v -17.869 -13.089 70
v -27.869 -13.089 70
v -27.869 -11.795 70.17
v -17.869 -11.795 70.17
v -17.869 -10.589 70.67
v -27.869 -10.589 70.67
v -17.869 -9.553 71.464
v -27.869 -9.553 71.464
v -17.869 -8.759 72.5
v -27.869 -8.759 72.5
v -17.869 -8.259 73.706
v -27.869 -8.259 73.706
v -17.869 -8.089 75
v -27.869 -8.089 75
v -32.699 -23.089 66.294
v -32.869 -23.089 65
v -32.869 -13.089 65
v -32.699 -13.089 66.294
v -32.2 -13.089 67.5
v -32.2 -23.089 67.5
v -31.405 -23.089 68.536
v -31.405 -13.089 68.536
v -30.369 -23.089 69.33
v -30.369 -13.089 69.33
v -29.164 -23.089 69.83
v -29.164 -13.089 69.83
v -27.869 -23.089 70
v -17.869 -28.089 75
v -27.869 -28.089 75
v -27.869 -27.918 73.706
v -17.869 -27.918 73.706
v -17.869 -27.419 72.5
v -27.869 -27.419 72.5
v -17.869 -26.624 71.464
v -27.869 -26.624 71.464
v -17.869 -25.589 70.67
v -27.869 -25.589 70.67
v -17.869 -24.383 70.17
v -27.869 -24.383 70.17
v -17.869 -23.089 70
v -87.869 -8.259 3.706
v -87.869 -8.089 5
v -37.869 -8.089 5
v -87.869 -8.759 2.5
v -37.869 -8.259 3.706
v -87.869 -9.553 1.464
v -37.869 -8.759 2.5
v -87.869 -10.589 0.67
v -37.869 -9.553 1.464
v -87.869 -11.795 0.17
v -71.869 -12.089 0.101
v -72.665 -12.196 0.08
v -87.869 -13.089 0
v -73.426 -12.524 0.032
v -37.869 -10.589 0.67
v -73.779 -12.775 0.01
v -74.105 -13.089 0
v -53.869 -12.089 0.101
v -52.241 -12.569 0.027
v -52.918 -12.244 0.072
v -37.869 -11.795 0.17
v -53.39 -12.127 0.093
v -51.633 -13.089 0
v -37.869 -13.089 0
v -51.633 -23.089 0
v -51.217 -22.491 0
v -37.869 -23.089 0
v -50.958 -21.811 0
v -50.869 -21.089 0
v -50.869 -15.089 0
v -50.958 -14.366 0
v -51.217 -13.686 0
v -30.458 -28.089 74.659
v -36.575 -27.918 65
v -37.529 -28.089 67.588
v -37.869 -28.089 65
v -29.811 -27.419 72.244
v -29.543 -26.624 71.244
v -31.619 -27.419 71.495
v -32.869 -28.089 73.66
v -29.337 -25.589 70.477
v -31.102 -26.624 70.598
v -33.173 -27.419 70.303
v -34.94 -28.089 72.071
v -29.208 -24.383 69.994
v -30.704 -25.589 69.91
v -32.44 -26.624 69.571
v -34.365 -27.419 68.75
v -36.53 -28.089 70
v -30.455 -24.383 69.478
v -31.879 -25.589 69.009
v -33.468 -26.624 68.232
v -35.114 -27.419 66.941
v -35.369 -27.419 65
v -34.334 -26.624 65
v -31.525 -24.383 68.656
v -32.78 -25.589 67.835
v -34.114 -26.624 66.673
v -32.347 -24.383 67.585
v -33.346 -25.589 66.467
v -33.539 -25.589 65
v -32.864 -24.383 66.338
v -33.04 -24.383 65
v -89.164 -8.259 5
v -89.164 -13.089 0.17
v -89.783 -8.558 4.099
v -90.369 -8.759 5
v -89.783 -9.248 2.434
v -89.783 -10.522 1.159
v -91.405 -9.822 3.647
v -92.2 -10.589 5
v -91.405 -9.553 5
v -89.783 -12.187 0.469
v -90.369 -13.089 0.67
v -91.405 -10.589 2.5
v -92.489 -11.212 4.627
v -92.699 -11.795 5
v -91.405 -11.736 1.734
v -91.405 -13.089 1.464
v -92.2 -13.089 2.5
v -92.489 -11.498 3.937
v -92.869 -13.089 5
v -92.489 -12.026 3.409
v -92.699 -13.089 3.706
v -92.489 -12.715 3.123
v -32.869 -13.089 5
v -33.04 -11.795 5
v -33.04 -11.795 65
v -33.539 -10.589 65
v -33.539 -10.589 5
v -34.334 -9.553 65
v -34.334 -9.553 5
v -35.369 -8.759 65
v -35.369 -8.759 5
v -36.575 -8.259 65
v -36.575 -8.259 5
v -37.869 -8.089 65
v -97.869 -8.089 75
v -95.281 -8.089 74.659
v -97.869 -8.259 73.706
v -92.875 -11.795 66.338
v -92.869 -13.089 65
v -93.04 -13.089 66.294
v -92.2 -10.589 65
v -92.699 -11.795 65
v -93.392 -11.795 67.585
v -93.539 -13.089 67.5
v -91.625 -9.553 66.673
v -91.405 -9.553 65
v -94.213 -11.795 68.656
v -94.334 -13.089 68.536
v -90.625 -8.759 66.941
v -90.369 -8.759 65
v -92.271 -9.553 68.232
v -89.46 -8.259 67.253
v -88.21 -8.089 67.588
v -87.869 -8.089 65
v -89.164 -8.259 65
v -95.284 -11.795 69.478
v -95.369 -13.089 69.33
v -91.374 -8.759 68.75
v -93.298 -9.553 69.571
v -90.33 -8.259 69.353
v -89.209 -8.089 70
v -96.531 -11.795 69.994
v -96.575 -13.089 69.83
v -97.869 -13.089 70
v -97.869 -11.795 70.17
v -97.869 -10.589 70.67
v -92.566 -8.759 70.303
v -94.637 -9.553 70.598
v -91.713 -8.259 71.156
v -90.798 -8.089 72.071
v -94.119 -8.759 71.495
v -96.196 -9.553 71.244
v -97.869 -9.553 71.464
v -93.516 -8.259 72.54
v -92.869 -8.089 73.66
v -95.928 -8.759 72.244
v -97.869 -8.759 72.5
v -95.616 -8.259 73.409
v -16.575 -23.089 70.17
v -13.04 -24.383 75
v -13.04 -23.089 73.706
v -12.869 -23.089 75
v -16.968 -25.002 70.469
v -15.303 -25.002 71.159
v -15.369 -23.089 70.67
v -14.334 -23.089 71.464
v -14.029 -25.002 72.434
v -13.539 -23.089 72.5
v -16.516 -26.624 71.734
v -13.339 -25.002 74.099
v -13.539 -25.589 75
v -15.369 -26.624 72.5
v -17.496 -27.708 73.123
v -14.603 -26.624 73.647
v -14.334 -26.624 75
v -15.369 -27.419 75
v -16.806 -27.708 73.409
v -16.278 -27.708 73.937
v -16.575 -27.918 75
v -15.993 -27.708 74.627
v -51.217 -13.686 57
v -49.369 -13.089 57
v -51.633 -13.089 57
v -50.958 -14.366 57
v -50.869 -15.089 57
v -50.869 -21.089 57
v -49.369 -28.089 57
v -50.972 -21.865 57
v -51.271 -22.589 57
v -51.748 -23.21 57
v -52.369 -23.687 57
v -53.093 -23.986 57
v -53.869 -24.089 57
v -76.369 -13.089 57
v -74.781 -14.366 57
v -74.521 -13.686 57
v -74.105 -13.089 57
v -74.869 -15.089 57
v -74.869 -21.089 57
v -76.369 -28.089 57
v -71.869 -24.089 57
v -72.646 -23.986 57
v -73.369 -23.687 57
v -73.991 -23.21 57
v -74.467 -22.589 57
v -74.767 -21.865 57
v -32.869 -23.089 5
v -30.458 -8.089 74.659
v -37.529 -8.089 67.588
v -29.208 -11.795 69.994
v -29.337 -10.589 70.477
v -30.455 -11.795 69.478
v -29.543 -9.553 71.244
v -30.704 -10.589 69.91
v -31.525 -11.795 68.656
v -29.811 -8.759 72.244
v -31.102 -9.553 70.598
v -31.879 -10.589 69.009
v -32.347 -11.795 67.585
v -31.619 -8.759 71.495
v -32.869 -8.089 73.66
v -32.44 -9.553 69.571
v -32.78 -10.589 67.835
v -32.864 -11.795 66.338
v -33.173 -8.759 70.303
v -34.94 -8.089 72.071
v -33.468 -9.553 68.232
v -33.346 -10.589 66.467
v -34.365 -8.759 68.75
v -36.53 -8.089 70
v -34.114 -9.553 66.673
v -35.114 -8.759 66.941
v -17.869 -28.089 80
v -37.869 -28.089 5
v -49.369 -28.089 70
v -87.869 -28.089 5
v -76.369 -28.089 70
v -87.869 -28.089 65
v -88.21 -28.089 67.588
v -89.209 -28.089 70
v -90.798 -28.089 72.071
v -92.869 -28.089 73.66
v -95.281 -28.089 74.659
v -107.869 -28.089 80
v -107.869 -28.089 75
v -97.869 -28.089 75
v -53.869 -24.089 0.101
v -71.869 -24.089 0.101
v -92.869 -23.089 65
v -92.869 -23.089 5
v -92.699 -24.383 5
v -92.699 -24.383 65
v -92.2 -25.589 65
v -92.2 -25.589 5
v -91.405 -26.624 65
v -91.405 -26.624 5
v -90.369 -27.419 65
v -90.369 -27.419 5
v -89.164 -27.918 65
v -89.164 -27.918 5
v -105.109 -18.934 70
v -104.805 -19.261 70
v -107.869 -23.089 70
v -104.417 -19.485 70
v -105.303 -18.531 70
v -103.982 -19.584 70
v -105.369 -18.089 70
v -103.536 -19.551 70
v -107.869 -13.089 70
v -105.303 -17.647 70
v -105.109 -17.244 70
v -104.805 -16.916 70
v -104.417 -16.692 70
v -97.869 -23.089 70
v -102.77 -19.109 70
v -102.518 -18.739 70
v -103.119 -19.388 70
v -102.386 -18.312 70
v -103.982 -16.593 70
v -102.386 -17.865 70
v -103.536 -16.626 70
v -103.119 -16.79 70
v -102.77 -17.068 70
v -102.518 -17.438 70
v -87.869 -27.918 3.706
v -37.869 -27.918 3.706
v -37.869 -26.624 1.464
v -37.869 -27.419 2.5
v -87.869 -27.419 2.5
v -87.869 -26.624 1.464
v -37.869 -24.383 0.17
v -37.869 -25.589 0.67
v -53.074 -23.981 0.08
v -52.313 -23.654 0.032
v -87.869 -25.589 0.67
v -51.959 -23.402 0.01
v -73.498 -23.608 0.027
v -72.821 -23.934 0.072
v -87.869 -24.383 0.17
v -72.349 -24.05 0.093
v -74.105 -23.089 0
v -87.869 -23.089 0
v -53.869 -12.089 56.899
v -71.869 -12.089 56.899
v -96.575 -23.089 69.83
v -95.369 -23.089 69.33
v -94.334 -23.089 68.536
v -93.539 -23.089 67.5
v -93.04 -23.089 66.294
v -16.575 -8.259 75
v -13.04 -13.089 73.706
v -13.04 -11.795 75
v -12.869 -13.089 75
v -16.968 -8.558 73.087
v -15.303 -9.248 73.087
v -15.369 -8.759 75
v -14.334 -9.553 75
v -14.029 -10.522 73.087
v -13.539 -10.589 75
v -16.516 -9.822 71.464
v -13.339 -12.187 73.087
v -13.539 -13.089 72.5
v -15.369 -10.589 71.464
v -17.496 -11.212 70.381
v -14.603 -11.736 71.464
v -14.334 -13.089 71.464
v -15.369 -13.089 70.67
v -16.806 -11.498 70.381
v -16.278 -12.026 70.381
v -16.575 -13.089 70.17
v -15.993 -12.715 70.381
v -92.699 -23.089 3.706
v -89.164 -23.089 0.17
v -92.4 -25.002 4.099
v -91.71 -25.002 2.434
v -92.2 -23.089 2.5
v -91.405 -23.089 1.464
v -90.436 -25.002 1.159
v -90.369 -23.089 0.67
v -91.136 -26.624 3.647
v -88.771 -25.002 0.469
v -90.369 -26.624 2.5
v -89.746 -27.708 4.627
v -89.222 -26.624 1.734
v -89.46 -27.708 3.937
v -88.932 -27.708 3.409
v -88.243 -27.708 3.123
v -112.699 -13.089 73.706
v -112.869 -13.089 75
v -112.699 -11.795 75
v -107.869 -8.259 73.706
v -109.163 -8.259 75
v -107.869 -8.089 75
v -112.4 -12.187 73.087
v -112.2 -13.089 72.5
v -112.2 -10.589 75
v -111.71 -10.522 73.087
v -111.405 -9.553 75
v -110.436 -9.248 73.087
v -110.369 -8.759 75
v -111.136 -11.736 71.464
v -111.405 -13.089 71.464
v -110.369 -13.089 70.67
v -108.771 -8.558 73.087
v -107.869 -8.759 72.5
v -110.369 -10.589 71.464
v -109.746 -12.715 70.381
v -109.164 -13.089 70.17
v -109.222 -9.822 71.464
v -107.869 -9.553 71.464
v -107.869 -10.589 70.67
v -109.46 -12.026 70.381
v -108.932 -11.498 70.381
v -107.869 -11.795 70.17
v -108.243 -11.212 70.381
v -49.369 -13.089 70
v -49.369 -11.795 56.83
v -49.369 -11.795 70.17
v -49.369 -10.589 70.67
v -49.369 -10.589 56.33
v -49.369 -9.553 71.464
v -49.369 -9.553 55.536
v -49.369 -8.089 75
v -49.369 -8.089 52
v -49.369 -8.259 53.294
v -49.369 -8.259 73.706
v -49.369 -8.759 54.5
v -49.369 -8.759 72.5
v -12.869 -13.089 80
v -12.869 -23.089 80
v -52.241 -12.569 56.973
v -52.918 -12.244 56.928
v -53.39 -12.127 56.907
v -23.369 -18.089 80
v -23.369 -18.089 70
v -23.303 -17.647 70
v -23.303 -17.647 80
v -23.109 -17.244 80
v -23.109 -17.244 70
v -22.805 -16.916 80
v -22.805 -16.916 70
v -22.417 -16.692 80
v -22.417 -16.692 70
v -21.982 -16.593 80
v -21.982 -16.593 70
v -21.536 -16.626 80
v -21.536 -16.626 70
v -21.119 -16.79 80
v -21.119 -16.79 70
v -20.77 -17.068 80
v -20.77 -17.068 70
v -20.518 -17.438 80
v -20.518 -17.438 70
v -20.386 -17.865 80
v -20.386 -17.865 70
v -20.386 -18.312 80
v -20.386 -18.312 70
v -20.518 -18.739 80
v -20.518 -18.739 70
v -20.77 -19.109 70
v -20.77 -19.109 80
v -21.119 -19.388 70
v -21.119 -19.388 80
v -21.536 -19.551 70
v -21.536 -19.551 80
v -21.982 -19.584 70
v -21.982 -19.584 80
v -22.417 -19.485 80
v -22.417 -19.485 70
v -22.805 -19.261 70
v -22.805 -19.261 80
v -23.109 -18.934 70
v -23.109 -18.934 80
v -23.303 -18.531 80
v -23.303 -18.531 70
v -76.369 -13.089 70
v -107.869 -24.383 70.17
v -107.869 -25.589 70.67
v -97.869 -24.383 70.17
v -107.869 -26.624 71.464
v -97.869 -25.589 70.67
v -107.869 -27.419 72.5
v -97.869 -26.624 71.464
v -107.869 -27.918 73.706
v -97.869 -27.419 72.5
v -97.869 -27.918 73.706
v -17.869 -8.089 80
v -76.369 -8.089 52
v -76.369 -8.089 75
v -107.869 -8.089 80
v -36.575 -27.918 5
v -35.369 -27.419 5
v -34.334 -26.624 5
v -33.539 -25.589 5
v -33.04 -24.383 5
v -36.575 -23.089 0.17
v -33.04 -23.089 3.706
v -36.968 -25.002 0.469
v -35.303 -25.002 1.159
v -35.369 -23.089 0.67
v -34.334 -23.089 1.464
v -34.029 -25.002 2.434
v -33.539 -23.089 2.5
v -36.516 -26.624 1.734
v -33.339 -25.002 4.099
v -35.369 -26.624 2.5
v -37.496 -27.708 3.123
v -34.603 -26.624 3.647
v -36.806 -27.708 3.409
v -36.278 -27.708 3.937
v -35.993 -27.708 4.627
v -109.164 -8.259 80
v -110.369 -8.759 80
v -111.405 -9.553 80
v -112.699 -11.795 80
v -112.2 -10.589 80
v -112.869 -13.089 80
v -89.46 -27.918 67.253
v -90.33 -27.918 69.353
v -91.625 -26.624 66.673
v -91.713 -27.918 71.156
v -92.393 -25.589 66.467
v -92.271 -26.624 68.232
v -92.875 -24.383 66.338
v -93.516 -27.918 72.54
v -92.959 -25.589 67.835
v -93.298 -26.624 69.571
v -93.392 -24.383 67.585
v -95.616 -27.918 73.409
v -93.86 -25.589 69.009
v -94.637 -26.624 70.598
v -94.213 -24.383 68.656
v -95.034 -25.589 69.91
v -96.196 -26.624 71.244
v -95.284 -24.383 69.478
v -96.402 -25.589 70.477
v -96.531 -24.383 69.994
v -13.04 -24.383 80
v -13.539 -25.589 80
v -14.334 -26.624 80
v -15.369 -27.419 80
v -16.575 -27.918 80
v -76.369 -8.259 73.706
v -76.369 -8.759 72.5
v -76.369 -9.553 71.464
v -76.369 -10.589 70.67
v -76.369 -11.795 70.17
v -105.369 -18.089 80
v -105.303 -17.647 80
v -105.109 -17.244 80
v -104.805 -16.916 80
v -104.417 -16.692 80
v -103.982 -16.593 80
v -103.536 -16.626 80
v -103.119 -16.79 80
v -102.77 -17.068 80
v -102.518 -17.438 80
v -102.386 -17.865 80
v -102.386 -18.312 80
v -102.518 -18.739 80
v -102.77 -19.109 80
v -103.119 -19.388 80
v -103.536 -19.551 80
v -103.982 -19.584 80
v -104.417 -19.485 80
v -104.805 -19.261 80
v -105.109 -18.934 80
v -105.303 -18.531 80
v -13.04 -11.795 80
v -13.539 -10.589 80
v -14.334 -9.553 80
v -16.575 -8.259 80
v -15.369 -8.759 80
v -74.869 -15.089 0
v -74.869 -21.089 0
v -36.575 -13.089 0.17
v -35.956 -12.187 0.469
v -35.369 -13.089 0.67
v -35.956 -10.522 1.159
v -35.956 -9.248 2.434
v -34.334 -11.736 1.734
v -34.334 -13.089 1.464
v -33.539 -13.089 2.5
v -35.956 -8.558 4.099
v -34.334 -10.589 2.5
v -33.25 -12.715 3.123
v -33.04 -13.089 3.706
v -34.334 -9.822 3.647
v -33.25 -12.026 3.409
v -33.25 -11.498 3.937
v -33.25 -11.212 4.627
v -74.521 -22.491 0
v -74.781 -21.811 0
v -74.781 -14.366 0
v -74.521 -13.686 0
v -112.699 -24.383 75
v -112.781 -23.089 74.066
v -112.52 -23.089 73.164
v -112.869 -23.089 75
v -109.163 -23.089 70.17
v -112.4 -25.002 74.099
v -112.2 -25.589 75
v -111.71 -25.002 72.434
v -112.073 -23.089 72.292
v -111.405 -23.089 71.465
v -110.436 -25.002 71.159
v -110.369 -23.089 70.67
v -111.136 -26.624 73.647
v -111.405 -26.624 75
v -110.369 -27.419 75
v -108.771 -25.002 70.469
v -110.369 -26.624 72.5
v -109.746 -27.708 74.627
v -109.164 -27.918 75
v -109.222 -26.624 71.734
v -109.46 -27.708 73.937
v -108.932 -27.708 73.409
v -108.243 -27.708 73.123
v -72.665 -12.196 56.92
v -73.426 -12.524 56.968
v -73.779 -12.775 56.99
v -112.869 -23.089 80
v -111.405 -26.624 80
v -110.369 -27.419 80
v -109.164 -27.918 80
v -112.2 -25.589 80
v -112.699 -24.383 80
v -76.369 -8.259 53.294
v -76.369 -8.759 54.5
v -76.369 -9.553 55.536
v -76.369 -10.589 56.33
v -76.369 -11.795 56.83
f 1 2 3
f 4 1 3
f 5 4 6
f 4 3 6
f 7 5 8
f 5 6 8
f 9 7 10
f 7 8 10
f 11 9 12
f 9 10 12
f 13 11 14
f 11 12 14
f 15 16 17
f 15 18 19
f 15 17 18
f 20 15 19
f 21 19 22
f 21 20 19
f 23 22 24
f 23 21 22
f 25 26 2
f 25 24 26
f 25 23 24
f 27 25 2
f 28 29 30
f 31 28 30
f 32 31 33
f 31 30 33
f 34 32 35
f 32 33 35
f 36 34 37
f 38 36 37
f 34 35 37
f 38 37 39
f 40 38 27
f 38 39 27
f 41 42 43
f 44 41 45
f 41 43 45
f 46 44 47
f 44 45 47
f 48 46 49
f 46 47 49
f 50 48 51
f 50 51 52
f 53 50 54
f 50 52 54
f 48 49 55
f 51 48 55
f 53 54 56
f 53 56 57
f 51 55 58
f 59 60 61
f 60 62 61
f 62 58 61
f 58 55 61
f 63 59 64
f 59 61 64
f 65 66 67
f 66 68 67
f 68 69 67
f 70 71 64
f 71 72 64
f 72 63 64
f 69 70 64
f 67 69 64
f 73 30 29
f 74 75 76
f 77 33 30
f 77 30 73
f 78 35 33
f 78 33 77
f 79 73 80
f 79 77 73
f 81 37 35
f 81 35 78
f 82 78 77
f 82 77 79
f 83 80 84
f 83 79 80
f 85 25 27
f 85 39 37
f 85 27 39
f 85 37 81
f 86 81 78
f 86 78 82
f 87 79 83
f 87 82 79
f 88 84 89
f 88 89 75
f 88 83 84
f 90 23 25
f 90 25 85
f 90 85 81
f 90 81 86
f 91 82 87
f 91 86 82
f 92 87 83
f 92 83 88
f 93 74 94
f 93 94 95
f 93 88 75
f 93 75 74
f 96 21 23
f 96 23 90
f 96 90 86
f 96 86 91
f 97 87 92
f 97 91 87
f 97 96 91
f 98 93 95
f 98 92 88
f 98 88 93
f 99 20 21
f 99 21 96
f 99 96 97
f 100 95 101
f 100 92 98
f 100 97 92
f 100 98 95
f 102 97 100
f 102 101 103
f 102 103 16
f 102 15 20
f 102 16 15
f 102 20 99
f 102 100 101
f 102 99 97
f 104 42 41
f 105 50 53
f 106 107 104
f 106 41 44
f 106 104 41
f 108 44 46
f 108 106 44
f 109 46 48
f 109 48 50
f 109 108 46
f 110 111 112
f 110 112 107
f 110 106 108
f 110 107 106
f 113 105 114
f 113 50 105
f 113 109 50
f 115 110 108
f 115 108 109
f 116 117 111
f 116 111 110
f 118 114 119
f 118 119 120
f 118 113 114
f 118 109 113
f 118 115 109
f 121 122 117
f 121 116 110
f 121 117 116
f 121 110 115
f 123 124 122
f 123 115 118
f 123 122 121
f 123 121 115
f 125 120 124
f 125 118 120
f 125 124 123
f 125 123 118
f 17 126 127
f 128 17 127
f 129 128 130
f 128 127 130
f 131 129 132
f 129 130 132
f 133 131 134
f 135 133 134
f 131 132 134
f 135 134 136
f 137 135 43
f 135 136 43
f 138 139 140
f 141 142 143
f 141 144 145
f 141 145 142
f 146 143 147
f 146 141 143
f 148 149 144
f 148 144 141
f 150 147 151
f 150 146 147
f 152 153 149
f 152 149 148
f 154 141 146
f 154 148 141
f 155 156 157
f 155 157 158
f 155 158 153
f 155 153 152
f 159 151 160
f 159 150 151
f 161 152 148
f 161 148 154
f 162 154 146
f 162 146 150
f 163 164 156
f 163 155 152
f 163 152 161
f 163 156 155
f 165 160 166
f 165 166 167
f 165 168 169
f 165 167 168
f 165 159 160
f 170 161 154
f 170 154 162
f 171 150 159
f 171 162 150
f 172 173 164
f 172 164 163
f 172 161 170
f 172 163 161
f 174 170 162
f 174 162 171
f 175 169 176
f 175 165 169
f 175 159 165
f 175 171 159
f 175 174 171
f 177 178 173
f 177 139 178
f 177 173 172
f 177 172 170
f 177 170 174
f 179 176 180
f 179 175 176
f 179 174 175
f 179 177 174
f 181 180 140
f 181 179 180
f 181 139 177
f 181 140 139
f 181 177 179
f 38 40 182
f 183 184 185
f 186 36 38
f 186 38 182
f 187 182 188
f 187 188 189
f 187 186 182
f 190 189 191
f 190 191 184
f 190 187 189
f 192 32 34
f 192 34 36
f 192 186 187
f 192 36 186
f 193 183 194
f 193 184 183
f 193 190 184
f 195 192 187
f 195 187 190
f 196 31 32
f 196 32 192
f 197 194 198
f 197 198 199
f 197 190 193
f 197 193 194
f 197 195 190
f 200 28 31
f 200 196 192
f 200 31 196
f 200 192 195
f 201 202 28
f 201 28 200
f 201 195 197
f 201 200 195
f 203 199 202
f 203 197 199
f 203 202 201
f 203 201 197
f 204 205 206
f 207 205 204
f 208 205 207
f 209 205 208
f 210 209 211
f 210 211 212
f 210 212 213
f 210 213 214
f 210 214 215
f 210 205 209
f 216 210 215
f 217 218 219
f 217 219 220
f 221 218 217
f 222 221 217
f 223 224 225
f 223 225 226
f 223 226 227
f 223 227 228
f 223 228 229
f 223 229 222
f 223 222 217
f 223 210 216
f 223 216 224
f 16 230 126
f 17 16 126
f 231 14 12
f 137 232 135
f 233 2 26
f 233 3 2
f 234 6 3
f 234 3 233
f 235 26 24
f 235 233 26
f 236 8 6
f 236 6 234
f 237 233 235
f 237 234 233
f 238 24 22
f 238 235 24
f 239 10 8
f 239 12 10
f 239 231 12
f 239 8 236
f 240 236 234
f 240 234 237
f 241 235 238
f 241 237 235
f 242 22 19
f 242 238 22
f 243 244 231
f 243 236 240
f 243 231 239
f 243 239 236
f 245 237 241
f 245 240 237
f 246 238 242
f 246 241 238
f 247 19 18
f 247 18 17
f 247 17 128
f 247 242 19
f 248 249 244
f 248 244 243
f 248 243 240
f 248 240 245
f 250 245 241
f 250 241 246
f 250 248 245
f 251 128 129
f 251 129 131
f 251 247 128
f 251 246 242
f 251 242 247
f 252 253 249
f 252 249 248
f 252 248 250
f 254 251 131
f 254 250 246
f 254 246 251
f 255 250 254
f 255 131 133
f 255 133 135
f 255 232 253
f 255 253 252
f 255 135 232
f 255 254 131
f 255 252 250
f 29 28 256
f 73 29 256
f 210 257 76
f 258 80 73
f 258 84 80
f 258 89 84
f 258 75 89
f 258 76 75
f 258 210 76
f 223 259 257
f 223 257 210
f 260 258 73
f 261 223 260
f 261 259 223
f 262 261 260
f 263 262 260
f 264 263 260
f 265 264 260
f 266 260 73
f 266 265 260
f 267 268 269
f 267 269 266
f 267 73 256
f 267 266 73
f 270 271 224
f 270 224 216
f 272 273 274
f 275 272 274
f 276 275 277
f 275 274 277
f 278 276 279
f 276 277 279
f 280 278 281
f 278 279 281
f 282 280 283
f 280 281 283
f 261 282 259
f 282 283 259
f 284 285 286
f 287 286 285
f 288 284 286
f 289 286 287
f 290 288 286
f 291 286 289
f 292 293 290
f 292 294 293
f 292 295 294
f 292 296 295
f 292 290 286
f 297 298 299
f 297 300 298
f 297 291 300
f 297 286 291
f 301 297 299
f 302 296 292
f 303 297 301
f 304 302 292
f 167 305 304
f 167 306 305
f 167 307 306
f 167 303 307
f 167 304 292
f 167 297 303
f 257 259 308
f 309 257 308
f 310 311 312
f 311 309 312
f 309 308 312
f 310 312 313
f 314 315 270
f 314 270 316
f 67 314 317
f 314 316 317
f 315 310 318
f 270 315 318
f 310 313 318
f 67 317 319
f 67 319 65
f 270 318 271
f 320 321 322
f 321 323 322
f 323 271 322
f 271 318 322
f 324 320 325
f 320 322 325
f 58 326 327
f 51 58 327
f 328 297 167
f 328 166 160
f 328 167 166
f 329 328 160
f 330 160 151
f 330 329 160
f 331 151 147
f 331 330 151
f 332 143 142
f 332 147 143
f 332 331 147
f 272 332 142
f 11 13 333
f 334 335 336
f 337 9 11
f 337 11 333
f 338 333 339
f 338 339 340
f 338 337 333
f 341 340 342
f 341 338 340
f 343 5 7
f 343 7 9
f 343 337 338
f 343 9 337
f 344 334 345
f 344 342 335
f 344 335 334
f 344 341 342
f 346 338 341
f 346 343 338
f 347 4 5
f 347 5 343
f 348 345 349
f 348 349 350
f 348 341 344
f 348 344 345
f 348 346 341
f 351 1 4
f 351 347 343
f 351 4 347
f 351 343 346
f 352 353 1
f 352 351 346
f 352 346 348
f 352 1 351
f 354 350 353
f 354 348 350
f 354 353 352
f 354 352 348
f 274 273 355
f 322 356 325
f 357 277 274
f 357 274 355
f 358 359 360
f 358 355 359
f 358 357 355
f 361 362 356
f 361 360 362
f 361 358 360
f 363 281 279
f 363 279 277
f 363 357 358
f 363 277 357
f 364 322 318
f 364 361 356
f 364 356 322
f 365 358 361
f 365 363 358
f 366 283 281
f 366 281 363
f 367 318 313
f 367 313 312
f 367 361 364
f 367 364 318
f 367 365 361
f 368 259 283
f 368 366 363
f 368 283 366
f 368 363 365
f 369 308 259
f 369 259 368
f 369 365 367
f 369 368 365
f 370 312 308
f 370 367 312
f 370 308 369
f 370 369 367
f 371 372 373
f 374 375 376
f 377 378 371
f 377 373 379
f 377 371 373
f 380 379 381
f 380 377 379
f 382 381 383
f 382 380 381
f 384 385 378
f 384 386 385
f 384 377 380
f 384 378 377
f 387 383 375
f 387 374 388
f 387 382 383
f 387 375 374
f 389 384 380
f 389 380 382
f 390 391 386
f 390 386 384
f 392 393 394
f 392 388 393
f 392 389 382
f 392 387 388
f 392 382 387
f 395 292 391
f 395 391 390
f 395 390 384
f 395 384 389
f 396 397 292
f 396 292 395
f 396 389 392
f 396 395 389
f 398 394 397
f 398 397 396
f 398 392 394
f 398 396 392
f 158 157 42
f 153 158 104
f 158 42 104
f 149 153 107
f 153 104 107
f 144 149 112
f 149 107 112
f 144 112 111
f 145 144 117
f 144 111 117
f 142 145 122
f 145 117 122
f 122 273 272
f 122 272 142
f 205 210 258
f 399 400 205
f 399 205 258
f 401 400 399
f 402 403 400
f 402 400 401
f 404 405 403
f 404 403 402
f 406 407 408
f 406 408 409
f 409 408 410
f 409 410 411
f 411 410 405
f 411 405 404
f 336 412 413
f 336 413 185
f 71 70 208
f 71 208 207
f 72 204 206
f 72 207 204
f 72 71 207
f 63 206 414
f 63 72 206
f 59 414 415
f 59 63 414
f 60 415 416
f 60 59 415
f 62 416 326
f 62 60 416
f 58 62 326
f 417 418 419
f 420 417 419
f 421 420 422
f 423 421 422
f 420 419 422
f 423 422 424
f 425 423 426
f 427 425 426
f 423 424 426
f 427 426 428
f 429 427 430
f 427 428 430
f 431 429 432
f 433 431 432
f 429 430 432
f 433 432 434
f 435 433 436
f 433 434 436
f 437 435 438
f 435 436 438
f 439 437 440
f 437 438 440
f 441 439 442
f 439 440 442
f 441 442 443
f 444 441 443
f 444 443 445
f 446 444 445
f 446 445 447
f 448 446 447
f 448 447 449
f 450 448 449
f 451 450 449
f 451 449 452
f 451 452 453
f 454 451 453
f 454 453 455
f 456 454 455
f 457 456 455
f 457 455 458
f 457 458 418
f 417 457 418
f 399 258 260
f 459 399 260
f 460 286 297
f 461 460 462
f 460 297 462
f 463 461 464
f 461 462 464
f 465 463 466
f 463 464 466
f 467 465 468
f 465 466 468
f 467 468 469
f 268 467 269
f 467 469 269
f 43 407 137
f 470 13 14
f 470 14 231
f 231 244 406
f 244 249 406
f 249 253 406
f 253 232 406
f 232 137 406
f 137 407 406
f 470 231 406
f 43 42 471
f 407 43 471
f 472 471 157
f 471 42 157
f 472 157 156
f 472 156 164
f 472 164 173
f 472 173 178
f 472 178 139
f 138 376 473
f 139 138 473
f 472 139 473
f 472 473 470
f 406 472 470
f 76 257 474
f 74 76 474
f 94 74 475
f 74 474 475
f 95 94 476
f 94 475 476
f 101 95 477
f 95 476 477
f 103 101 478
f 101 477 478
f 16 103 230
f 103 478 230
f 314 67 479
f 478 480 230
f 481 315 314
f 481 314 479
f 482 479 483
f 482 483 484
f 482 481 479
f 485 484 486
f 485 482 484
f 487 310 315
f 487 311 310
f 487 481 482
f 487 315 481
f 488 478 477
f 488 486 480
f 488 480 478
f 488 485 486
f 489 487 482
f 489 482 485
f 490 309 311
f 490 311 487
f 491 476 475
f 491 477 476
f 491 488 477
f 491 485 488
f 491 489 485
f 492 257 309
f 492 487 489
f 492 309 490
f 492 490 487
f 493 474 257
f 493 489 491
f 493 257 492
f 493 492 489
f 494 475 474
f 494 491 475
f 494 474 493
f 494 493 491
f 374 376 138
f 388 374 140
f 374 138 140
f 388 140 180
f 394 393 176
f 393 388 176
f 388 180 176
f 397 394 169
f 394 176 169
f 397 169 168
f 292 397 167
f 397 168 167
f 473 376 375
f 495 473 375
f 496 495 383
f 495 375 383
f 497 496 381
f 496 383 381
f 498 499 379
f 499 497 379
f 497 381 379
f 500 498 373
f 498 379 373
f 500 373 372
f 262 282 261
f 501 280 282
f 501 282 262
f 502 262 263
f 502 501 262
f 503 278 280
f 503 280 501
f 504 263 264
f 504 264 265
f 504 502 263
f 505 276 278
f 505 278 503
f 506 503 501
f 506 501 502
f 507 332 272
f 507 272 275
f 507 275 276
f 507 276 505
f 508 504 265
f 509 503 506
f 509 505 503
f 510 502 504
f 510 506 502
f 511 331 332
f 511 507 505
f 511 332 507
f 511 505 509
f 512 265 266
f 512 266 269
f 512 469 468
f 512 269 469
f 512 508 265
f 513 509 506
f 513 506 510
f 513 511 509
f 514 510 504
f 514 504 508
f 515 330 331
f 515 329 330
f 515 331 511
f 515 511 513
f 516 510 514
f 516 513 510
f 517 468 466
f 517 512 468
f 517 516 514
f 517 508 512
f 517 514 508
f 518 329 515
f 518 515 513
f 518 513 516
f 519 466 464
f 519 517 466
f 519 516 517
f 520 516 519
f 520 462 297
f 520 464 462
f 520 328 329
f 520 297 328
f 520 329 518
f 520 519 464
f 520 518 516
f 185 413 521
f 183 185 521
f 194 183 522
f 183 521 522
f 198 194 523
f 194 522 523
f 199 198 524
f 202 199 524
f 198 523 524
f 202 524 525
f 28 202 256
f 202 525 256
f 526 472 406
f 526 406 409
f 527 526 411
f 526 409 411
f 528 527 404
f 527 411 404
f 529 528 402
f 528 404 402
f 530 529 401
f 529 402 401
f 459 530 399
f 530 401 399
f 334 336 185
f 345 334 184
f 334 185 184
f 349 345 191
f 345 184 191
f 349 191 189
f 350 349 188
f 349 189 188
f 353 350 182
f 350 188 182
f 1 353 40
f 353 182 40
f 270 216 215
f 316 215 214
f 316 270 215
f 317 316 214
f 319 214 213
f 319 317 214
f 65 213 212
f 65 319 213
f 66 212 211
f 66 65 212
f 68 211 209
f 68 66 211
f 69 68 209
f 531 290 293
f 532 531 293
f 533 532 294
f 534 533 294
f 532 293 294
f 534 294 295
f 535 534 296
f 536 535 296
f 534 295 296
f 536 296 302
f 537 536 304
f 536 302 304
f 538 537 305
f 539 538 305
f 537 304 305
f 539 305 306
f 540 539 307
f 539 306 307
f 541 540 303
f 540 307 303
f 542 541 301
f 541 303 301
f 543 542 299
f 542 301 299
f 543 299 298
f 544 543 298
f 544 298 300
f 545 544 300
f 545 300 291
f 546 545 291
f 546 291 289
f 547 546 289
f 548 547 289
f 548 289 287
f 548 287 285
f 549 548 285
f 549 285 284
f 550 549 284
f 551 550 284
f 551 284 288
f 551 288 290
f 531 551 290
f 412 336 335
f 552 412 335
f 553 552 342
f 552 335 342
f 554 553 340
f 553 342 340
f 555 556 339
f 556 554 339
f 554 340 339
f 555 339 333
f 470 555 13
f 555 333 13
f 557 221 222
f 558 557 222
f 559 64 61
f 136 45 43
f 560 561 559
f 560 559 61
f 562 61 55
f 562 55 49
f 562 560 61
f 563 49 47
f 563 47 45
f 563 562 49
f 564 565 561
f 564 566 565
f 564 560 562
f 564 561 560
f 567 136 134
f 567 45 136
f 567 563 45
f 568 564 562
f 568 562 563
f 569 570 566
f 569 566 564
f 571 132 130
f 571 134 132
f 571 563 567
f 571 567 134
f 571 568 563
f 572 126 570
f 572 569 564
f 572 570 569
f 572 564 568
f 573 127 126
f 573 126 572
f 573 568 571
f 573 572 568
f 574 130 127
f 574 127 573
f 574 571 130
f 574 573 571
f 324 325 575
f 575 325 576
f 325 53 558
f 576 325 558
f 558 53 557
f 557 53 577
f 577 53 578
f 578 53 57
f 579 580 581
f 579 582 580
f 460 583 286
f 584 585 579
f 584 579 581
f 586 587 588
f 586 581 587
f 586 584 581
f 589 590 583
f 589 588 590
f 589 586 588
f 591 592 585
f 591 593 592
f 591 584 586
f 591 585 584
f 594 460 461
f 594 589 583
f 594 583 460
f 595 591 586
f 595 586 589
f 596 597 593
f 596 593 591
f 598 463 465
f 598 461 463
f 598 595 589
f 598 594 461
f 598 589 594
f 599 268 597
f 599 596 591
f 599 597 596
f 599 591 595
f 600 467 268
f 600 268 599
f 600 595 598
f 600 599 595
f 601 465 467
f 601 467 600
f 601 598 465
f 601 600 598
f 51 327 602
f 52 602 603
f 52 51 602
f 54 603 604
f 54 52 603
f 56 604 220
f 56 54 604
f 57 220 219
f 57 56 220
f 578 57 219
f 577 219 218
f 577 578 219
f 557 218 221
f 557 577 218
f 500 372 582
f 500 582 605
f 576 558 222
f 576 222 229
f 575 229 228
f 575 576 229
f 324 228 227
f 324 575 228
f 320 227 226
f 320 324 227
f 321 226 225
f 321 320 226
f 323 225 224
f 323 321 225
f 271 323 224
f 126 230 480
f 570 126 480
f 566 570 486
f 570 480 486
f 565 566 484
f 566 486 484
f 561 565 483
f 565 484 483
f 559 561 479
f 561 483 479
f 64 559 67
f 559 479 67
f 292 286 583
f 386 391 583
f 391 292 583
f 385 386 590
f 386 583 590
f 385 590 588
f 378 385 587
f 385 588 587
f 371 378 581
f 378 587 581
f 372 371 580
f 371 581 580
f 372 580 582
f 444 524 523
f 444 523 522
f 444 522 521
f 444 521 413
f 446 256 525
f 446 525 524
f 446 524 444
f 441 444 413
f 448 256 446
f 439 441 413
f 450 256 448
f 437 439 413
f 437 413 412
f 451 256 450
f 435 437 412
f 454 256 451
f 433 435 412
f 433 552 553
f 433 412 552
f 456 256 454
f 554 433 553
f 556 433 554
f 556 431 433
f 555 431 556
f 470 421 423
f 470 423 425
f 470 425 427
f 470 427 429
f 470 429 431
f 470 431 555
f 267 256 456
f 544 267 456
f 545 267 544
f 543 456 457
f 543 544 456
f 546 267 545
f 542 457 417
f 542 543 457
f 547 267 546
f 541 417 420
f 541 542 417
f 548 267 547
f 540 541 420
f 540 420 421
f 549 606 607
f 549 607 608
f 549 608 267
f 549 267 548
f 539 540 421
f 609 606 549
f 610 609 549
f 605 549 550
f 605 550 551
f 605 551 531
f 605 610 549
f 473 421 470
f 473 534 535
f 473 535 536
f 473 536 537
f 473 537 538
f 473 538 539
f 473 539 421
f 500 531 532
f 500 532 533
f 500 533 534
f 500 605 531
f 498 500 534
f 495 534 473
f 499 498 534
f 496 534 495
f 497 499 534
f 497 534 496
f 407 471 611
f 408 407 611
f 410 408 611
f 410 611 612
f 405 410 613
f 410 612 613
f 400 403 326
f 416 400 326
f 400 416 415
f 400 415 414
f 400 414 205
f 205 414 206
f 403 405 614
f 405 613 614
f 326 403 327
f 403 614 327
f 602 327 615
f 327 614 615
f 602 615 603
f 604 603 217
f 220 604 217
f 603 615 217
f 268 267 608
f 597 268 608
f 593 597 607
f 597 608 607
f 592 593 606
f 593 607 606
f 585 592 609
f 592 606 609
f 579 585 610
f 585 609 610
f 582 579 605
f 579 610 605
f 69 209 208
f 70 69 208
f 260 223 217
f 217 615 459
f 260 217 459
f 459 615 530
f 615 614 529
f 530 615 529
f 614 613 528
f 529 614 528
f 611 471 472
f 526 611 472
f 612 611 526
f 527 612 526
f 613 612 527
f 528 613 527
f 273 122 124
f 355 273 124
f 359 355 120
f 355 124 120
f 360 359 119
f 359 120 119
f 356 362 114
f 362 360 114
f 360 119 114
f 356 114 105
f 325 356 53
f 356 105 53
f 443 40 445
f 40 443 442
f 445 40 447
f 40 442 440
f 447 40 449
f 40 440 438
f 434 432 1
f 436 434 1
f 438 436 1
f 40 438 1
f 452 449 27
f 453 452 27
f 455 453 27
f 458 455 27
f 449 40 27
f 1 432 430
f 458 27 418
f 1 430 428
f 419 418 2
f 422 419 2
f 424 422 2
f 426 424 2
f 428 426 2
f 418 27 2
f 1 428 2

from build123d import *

# Parameters (mm, degrees)
ESBO_O1_W                = 60
ESBO_O1_H                = 20
RESSALTO_EXTRUS_O1_DEPTH = 80
ESBO_O4_W                = 27
ESBO_O4_H                = 13
CORTE_EXTRUS_O2_DEPTH    = 125.196330299
ESBO_O6_W                = 10
ESBO_O6_H                = 20
RESSALTO_EXTRUS_O2_DEPTH = 20
ESBO_O5_W                = 10
ESBO_O5_H                = 20
RESSALTO_EXTRUS_O3_DEPTH = 20
CORTE_EXTRUS_O4_REACH    = 143.168
FILETE1_R                = 5
ESBO_O8_R                = 1.5
CORTE_EXTRUS_O5_DEPTH    = 136.751531604
FILETE2_R                = 5


with BuildPart() as part:
    # Esboço1 → Ressalto-extrusão1 (new body)
    with BuildSketch(Plane.XY):
        with Locations((-62.86941617, -18.088666872)):
            Rectangle(ESBO_O1_W, ESBO_O1_H)
    extrude(amount=RESSALTO_EXTRUS_O1_DEPTH)

    # Esboço4 → Corte-extrusão2 (cut, through all)
    with BuildSketch(Plane(origin=(0, -28.088666872, 0), x_dir=(-1, 0, 0), z_dir=(0, -1, 0))):
        with Locations((62.86941617, -63.5)):
            Rectangle(ESBO_O4_W, ESBO_O4_H)
    extrude(amount=-CORTE_EXTRUS_O2_DEPTH, mode=Mode.SUBTRACT)

    # Esboço6 → Ressalto-extrusão2 (add)
    with BuildSketch(Plane.ZY.offset(92.86941617)):
        with Locations((75, -18.088666872)):
            Rectangle(ESBO_O6_W, ESBO_O6_H)
    extrude(amount=RESSALTO_EXTRUS_O2_DEPTH)

    # Esboço5 → Ressalto-extrusão3 (add)
    with BuildSketch(Plane(origin=(-32.86941617, 0, 0), x_dir=(0, 0, -1), z_dir=(1, 0, 0))):
        with Locations((-75, -18.088666872)):
            Rectangle(ESBO_O5_W, ESBO_O5_H)
    extrude(amount=RESSALTO_EXTRUS_O3_DEPTH)

    # Esboço7 → Corte-extrusão4 (cut, up to next)
    with BuildSketch(Plane(origin=(0, 0, 0), x_dir=(-1, 0, 0), z_dir=(0, 0, -1)), mode=Mode.PRIVATE) as corte_extrus_o4_sk1:
        with BuildLine():
            Line((71.86941617, -24.088666872), (53.86941617, -24.088666872))
            ThreePointArc((53.86941617, -24.088666872), (51.748095827, -23.209987216), (50.86941617, -21.088666872))
            Line((50.86941617, -21.088666872), (50.86941617, -15.088666872))
            ThreePointArc((50.86941617, -15.088666872), (51.748095827, -12.967346529), (53.86941617, -12.088666872))
            Line((53.86941617, -12.088666872), (71.86941617, -12.088666872))
            ThreePointArc((71.86941617, -12.088666872), (73.990736514, -12.967346529), (74.86941617, -15.088666872))
            Line((74.86941617, -15.088666872), (74.86941617, -21.088666872))
            ThreePointArc((74.86941617, -21.088666872), (73.990736514, -23.209987216), (71.86941617, -24.088666872))
        make_face()
    corte_extrus_o4_tool1 = extrude(corte_extrus_o4_sk1.sketch, amount=-CORTE_EXTRUS_O4_REACH, mode=Mode.PRIVATE) & part.part
    add(corte_extrus_o4_tool1.solids().sort_by_distance((-62.869416, -18.088667, 0))[0], mode=Mode.SUBTRACT)

    # Filete1
    # the kernel refuses this fillet: 5 mm, written as the material it adds along each edge
    with BuildSketch(Plane(origin=(-92.86941617, -28.088666872, 70), x_dir=(0, 0, -1), z_dir=(0, 1, 0)), Plane(origin=(-32.86941617, -28.088666872, 70), x_dir=(1, 0, 0), z_dir=(0, 1, 0))) as filete1_piece_1:
        with BuildLine():
            CenterArc((FILETE1_R, FILETE1_R), FILETE1_R, 180, 90)
            Line((0, FILETE1_R), (0, 0))
            Line((0, 0), (FILETE1_R, 0))
        make_face()
    extrude(amount=20)
    # the kernel refuses this fillet: 5 mm, written as the material it takes off along each edge
    with BuildSketch(Plane(origin=(-12.86941617, -8.088666872, 57.5), x_dir=(0, -1, 0), z_dir=(0, 0, 1)), Plane(origin=(-112.86941617, -28.088666872, 92.5), x_dir=(1, 0, 0), z_dir=(0, 0, -1))) as filete1_2_piece_1:
        with BuildLine():
            CenterArc((FILETE1_R, -FILETE1_R), FILETE1_R, 90, 90)
            Line((0, -FILETE1_R), (0, 0))
            Line((0, 0), (FILETE1_R, 0))
        make_face()
    extrude(amount=35, mode=Mode.SUBTRACT)
    with BuildSketch(Plane(origin=(-112.86941617, -8.088666872, 57.5), x_dir=(0, -1, 0), z_dir=(0, 0, 1)), Plane(origin=(-12.86941617, -28.088666872, 92.5), x_dir=(-1, 0, 0), z_dir=(0, 0, -1))) as filete1_2_piece_2:
        with BuildLine():
            CenterArc((FILETE1_R, FILETE1_R), FILETE1_R, 180, 90)
            Line((0, FILETE1_R), (0, 0))
            Line((0, 0), (FILETE1_R, 0))
        make_face()
    extrude(amount=35, mode=Mode.SUBTRACT)
    with BuildSketch(Plane(origin=(-112.86941617, -40.588666872, 70), x_dir=(1, 0, 0), z_dir=(0, 1, 0)), Plane(origin=(-12.86941617, -40.588666872, 70), x_dir=(0, 0, 1), z_dir=(0, 1, 0)), Plane(origin=(-92.86941617, 4.411333128, 0), x_dir=(0, 0, 1), z_dir=(0, -1, 0)), Plane(origin=(-32.86941617, -40.588666872, 0), x_dir=(0, 0, 1), z_dir=(0, 1, 0))) as filete1_2_piece_3:
        with BuildLine():
            CenterArc((FILETE1_R, -FILETE1_R), FILETE1_R, 90, 90)
            Line((0, -FILETE1_R), (0, 0))
            Line((0, 0), (FILETE1_R, 0))
        make_face()
    extrude(amount=45, mode=Mode.SUBTRACT)
    with BuildSketch(Plane(origin=(-105.36941617, -28.088666872, 0), x_dir=(0, 0, 1), z_dir=(1, 0, 0))) as filete1_2_piece_4:
        with BuildLine():
            CenterArc((FILETE1_R, -FILETE1_R), FILETE1_R, 90, 90)
            Line((0, -FILETE1_R), (0, 0))
            Line((0, 0), (FILETE1_R, 0))
        make_face()
    extrude(amount=85, mode=Mode.SUBTRACT)
    with BuildSketch(Plane(origin=(-20.36941617, -8.088666872, 0), x_dir=(0, -1, 0), z_dir=(-1, 0, 0))) as filete1_2_piece_5:
        with BuildLine():
            CenterArc((FILETE1_R, FILETE1_R), FILETE1_R, 180, 90)
            Line((0, FILETE1_R), (0, 0))
            Line((0, 0), (FILETE1_R, 0))
        make_face()
    extrude(amount=85, mode=Mode.SUBTRACT)
    # the kernel refuses this fillet: 5 mm, written as the material it takes off along each edge
    with BuildSketch(Plane(origin=(-87.86941617, -23.088666872, 5), x_dir=(-1, 0, 0), z_dir=(0, -1, 0))) as filete1_3_piece_1_section:
        Polygon((0, 0), (FILETE1_R, 0), (FILETE1_R, FILETE1_R), (0, FILETE1_R), align=None)
    filete1_3_piece_1 = extrude(amount=FILETE1_R, mode=Mode.PRIVATE)
    filete1_3_piece_1 = filete1_3_piece_1 - Plane(origin=(-87.86941617, -23.088666872, 5), x_dir=(0.7071067811865475, 0, 0.7071067811865475), z_dir=(0, -1, 0)) * Sphere(FILETE1_R, mode=Mode.PRIVATE)
    add(filete1_3_piece_1, mode=Mode.SUBTRACT)
    with BuildSketch(Plane(origin=(-87.86941617, -13.088666872, 5), x_dir=(0, 1, 0), z_dir=(-1, 0, 0))) as filete1_3_piece_2_section:
        Polygon((0, 0), (FILETE1_R, 0), (FILETE1_R, FILETE1_R), (0, FILETE1_R), align=None)
    filete1_3_piece_2 = extrude(amount=FILETE1_R, mode=Mode.PRIVATE)
    filete1_3_piece_2 = filete1_3_piece_2 - Plane(origin=(-87.86941617, -13.088666872, 5), x_dir=(0, -0.7071067811865475, 0.7071067811865475), z_dir=(-1, 0, 0)) * Sphere(FILETE1_R, mode=Mode.PRIVATE)
    add(filete1_3_piece_2, mode=Mode.SUBTRACT)
    with BuildSketch(Plane(origin=(-37.86941617, -13.088666872, 5), x_dir=(0, 1, 0), z_dir=(1, 0, 0))) as filete1_3_piece_3_section:
        Polygon((0, 0), (FILETE1_R, 0), (FILETE1_R, -FILETE1_R), (0, -FILETE1_R), align=None)
    filete1_3_piece_3 = extrude(amount=FILETE1_R, mode=Mode.PRIVATE)
    filete1_3_piece_3 = filete1_3_piece_3 - Plane(origin=(-37.86941617, -13.088666872, 5), x_dir=(0, -0.7071067811865475, 0.7071067811865475), z_dir=(1, 0, 0)) * Sphere(FILETE1_R, mode=Mode.PRIVATE)
    add(filete1_3_piece_3, mode=Mode.SUBTRACT)
    with BuildSketch(Plane(origin=(-37.86941617, -23.088666872, 5), x_dir=(1, 0, 0), z_dir=(0, -1, 0))) as filete1_3_piece_4_section:
        Polygon((0, 0), (FILETE1_R, 0), (FILETE1_R, -FILETE1_R), (0, -FILETE1_R), align=None)
    filete1_3_piece_4 = extrude(amount=FILETE1_R, mode=Mode.PRIVATE)
    filete1_3_piece_4 = filete1_3_piece_4 - Plane(origin=(-37.86941617, -23.088666872, 5), x_dir=(-0.7071067811865475, 0, 0.7071067811865475), z_dir=(0, -1, 0)) * Sphere(FILETE1_R, mode=Mode.PRIVATE)
    add(filete1_3_piece_4, mode=Mode.SUBTRACT)
    with BuildSketch(Plane(origin=(-107.86941617, -23.088666872, 75), x_dir=(0, 0, -1), z_dir=(0, -1, 0))) as filete1_3_piece_5_section:
        Polygon((0, 0), (FILETE1_R, 0), (FILETE1_R, -FILETE1_R), (0, -FILETE1_R), align=None)
    filete1_3_piece_5 = extrude(amount=FILETE1_R, mode=Mode.PRIVATE)
    filete1_3_piece_5 = filete1_3_piece_5 - Plane(origin=(-107.86941617, -23.088666872, 75), x_dir=(0.7071067811865475, 0, 0.7071067811865475), z_dir=(0, -1, 0)) * Sphere(FILETE1_R, mode=Mode.PRIVATE)
    add(filete1_3_piece_5, mode=Mode.SUBTRACT)
    with BuildSketch(Plane(origin=(-17.86941617, -13.088666872, 75), x_dir=(0, 1, 0), z_dir=(0, 0, -1))) as filete1_3_piece_6_section:
        Polygon((0, 0), (FILETE1_R, 0), (FILETE1_R, FILETE1_R), (0, FILETE1_R), align=None)
    filete1_3_piece_6 = extrude(amount=FILETE1_R, mode=Mode.PRIVATE)
    filete1_3_piece_6 = filete1_3_piece_6 - Plane(origin=(-17.86941617, -13.088666872, 75), x_dir=(-0.7071067811865475, -0.7071067811865475, 0), z_dir=(0, 0, -1)) * Sphere(FILETE1_R, mode=Mode.PRIVATE)
    add(filete1_3_piece_6, mode=Mode.SUBTRACT)
    with BuildSketch(Plane(origin=(-17.86941617, -23.088666872, 75), x_dir=(0, 0, -1), z_dir=(0, -1, 0))) as filete1_3_piece_7_section:
        Polygon((0, 0), (FILETE1_R, 0), (FILETE1_R, FILETE1_R), (0, FILETE1_R), align=None)
    filete1_3_piece_7 = extrude(amount=FILETE1_R, mode=Mode.PRIVATE)
    filete1_3_piece_7 = filete1_3_piece_7 - Plane(origin=(-17.86941617, -23.088666872, 75), x_dir=(-0.7071067811865475, 0, 0.7071067811865475), z_dir=(0, -1, 0)) * Sphere(FILETE1_R, mode=Mode.PRIVATE)
    add(filete1_3_piece_7, mode=Mode.SUBTRACT)
    with BuildSketch(Plane(origin=(-107.86941617, -13.088666872, 75), x_dir=(0, 1, 0), z_dir=(0, 0, -1))) as filete1_3_piece_8_section:
        Polygon((0, 0), (FILETE1_R, 0), (FILETE1_R, -FILETE1_R), (0, -FILETE1_R), align=None)
    filete1_3_piece_8 = extrude(amount=FILETE1_R, mode=Mode.PRIVATE)
    filete1_3_piece_8 = filete1_3_piece_8 - Plane(origin=(-107.86941617, -13.088666872, 75), x_dir=(0.7071067811865475, -0.7071067811865475, 0), z_dir=(0, 0, -1)) * Sphere(FILETE1_R, mode=Mode.PRIVATE)
    add(filete1_3_piece_8, mode=Mode.SUBTRACT)
    with BuildSketch(Plane(origin=(-97.86941617, -8.088666872, 70), x_dir=(0, -1, 0), z_dir=(-1, 0, 0)), Plane(origin=(-97.86941617, -28.088666872, 70), x_dir=(0, 0, 1), z_dir=(-1, 0, 0))) as filete1_3_piece_9:
        with BuildLine():
            CenterArc((FILETE1_R, FILETE1_R), FILETE1_R, 180, 90)
            Line((0, FILETE1_R), (0, 0))
            Line((0, 0), (FILETE1_R, 0))
        make_face()
    extrude(amount=10, mode=Mode.SUBTRACT)
    with BuildSketch(Plane(origin=(-27.86941617, -28.088666872, 70), x_dir=(0, 0, 1), z_dir=(1, 0, 0)), Plane(origin=(-27.86941617, -8.088666872, 70), x_dir=(0, -1, 0), z_dir=(1, 0, 0))) as filete1_3_piece_10:
        with BuildLine():
            CenterArc((FILETE1_R, -FILETE1_R), FILETE1_R, 90, 90)
            Line((0, -FILETE1_R), (0, 0))
            Line((0, 0), (FILETE1_R, 0))
        make_face()
    extrude(amount=10, mode=Mode.SUBTRACT)
    with BuildSketch(Plane(origin=(-32.86941617, -28.088666872, 5), x_dir=(-1, 0, 0), z_dir=(0, 0, 1)), Plane(origin=(-32.86941617, -8.088666872, 5), x_dir=(0, -1, 0), z_dir=(0, 0, 1))) as filete1_3_piece_11:
        with BuildLine():
            CenterArc((FILETE1_R, -FILETE1_R), FILETE1_R, 90, 90)
            Line((0, -FILETE1_R), (0, 0))
            Line((0, 0), (FILETE1_R, 0))
        make_face()
    extrude(amount=60, mode=Mode.SUBTRACT)
    with BuildSketch(Plane(origin=(-92.86941617, -8.088666872, 5), x_dir=(0, -1, 0), z_dir=(0, 0, 1)), Plane(origin=(-92.86941617, -28.088666872, 5), x_dir=(1, 0, 0), z_dir=(0, 0, 1))) as filete1_3_piece_12:
        with BuildLine():
            CenterArc((FILETE1_R, FILETE1_R), FILETE1_R, 180, 90)
            Line((0, FILETE1_R), (0, 0))
            Line((0, 0), (FILETE1_R, 0))
        make_face()
    extrude(amount=60, mode=Mode.SUBTRACT)
    with BuildSketch(Plane(origin=(-97.86941617, -28.088666872, 65), x_dir=(1, 0, 0), z_dir=(0, 0, -1))) as filete1_3_piece_13:
        with BuildLine():
            CenterArc((5 + FILETE1_R, -FILETE1_R), FILETE1_R, 90, 90)
            Line((5, -FILETE1_R), (5, 0))
            Line((5, 0), (5 + FILETE1_R, 0))
        make_face()
    revolve(axis=Axis((-97.86941617, -28.088666872, 65), (0, -1, 0)), revolution_arc=90, mode=Mode.SUBTRACT)
    with BuildSketch(Plane(origin=(-97.86941617, -8.088666872, 65), x_dir=(1, 0, 0), z_dir=(0, 0, -1))) as filete1_3_piece_14:
        with BuildLine():
            CenterArc((5 + FILETE1_R, FILETE1_R), FILETE1_R, 180, 90)
            Line((5 + FILETE1_R, 0), (5, 0))
            Line((5, 0), (5, FILETE1_R))
        make_face()
    revolve(axis=Axis((-97.86941617, -8.088666872, 65), (0, -1, 0)), revolution_arc=90, mode=Mode.SUBTRACT)
    with BuildSketch(Plane(origin=(-27.86941617, -8.088666872, 65), x_dir=(0, 0, 1), z_dir=(1, 0, 0))) as filete1_3_piece_15:
        with BuildLine():
            CenterArc((5 + FILETE1_R, FILETE1_R), FILETE1_R, 180, 90)
            Line((5 + FILETE1_R, 0), (5, 0))
            Line((5, 0), (5, FILETE1_R))
        make_face()
    revolve(axis=Axis((-27.86941617, -8.088666872, 65), (0, -1, 0)), revolution_arc=90, mode=Mode.SUBTRACT)
    with BuildSketch(Plane(origin=(-27.86941617, -28.088666872, 65), x_dir=(0, 0, 1), z_dir=(1, 0, 0))) as filete1_3_piece_16:
        with BuildLine():
            CenterArc((5 + FILETE1_R, -FILETE1_R), FILETE1_R, 90, 90)
            Line((5, -FILETE1_R), (5, 0))
            Line((5, 0), (5 + FILETE1_R, 0))
        make_face()
    revolve(axis=Axis((-27.86941617, -28.088666872, 65), (0, -1, 0)), revolution_arc=90, mode=Mode.SUBTRACT)

    # Esboço8 → Corte-extrusão5 (cut, through all)
    with BuildSketch(Plane(origin=(0, 0, 70), x_dir=(-1, 0, 0), z_dir=(0, 0, -1))):
        with Locations((21.86941617, -18.088666872)):
            Circle(ESBO_O8_R)
        with Locations((103.86941617, -18.088666872)):
            Circle(ESBO_O8_R)
    extrude(amount=-CORTE_EXTRUS_O5_DEPTH, mode=Mode.SUBTRACT)

    # Filete2
    # the kernel refuses this fillet: 5 mm, written as the material it takes off along each edge
    with BuildSketch(Plane(origin=(-49.36941617, -8.088666872, 70), x_dir=(0, 0, 1), z_dir=(-1, 0, 0)), Plane(origin=(-76.36941617, -8.088666872, 57), x_dir=(0, 0, -1), z_dir=(1, 0, 0))) as filete2_piece_1:
        with BuildLine():
            CenterArc((FILETE2_R, -FILETE2_R), FILETE2_R, 90, 90)
            Line((0, -FILETE2_R), (0, 0))
            Line((0, 0), (FILETE2_R, 0))
        make_face()
    extrude(amount=27, mode=Mode.SUBTRACT)


solid = part.part
